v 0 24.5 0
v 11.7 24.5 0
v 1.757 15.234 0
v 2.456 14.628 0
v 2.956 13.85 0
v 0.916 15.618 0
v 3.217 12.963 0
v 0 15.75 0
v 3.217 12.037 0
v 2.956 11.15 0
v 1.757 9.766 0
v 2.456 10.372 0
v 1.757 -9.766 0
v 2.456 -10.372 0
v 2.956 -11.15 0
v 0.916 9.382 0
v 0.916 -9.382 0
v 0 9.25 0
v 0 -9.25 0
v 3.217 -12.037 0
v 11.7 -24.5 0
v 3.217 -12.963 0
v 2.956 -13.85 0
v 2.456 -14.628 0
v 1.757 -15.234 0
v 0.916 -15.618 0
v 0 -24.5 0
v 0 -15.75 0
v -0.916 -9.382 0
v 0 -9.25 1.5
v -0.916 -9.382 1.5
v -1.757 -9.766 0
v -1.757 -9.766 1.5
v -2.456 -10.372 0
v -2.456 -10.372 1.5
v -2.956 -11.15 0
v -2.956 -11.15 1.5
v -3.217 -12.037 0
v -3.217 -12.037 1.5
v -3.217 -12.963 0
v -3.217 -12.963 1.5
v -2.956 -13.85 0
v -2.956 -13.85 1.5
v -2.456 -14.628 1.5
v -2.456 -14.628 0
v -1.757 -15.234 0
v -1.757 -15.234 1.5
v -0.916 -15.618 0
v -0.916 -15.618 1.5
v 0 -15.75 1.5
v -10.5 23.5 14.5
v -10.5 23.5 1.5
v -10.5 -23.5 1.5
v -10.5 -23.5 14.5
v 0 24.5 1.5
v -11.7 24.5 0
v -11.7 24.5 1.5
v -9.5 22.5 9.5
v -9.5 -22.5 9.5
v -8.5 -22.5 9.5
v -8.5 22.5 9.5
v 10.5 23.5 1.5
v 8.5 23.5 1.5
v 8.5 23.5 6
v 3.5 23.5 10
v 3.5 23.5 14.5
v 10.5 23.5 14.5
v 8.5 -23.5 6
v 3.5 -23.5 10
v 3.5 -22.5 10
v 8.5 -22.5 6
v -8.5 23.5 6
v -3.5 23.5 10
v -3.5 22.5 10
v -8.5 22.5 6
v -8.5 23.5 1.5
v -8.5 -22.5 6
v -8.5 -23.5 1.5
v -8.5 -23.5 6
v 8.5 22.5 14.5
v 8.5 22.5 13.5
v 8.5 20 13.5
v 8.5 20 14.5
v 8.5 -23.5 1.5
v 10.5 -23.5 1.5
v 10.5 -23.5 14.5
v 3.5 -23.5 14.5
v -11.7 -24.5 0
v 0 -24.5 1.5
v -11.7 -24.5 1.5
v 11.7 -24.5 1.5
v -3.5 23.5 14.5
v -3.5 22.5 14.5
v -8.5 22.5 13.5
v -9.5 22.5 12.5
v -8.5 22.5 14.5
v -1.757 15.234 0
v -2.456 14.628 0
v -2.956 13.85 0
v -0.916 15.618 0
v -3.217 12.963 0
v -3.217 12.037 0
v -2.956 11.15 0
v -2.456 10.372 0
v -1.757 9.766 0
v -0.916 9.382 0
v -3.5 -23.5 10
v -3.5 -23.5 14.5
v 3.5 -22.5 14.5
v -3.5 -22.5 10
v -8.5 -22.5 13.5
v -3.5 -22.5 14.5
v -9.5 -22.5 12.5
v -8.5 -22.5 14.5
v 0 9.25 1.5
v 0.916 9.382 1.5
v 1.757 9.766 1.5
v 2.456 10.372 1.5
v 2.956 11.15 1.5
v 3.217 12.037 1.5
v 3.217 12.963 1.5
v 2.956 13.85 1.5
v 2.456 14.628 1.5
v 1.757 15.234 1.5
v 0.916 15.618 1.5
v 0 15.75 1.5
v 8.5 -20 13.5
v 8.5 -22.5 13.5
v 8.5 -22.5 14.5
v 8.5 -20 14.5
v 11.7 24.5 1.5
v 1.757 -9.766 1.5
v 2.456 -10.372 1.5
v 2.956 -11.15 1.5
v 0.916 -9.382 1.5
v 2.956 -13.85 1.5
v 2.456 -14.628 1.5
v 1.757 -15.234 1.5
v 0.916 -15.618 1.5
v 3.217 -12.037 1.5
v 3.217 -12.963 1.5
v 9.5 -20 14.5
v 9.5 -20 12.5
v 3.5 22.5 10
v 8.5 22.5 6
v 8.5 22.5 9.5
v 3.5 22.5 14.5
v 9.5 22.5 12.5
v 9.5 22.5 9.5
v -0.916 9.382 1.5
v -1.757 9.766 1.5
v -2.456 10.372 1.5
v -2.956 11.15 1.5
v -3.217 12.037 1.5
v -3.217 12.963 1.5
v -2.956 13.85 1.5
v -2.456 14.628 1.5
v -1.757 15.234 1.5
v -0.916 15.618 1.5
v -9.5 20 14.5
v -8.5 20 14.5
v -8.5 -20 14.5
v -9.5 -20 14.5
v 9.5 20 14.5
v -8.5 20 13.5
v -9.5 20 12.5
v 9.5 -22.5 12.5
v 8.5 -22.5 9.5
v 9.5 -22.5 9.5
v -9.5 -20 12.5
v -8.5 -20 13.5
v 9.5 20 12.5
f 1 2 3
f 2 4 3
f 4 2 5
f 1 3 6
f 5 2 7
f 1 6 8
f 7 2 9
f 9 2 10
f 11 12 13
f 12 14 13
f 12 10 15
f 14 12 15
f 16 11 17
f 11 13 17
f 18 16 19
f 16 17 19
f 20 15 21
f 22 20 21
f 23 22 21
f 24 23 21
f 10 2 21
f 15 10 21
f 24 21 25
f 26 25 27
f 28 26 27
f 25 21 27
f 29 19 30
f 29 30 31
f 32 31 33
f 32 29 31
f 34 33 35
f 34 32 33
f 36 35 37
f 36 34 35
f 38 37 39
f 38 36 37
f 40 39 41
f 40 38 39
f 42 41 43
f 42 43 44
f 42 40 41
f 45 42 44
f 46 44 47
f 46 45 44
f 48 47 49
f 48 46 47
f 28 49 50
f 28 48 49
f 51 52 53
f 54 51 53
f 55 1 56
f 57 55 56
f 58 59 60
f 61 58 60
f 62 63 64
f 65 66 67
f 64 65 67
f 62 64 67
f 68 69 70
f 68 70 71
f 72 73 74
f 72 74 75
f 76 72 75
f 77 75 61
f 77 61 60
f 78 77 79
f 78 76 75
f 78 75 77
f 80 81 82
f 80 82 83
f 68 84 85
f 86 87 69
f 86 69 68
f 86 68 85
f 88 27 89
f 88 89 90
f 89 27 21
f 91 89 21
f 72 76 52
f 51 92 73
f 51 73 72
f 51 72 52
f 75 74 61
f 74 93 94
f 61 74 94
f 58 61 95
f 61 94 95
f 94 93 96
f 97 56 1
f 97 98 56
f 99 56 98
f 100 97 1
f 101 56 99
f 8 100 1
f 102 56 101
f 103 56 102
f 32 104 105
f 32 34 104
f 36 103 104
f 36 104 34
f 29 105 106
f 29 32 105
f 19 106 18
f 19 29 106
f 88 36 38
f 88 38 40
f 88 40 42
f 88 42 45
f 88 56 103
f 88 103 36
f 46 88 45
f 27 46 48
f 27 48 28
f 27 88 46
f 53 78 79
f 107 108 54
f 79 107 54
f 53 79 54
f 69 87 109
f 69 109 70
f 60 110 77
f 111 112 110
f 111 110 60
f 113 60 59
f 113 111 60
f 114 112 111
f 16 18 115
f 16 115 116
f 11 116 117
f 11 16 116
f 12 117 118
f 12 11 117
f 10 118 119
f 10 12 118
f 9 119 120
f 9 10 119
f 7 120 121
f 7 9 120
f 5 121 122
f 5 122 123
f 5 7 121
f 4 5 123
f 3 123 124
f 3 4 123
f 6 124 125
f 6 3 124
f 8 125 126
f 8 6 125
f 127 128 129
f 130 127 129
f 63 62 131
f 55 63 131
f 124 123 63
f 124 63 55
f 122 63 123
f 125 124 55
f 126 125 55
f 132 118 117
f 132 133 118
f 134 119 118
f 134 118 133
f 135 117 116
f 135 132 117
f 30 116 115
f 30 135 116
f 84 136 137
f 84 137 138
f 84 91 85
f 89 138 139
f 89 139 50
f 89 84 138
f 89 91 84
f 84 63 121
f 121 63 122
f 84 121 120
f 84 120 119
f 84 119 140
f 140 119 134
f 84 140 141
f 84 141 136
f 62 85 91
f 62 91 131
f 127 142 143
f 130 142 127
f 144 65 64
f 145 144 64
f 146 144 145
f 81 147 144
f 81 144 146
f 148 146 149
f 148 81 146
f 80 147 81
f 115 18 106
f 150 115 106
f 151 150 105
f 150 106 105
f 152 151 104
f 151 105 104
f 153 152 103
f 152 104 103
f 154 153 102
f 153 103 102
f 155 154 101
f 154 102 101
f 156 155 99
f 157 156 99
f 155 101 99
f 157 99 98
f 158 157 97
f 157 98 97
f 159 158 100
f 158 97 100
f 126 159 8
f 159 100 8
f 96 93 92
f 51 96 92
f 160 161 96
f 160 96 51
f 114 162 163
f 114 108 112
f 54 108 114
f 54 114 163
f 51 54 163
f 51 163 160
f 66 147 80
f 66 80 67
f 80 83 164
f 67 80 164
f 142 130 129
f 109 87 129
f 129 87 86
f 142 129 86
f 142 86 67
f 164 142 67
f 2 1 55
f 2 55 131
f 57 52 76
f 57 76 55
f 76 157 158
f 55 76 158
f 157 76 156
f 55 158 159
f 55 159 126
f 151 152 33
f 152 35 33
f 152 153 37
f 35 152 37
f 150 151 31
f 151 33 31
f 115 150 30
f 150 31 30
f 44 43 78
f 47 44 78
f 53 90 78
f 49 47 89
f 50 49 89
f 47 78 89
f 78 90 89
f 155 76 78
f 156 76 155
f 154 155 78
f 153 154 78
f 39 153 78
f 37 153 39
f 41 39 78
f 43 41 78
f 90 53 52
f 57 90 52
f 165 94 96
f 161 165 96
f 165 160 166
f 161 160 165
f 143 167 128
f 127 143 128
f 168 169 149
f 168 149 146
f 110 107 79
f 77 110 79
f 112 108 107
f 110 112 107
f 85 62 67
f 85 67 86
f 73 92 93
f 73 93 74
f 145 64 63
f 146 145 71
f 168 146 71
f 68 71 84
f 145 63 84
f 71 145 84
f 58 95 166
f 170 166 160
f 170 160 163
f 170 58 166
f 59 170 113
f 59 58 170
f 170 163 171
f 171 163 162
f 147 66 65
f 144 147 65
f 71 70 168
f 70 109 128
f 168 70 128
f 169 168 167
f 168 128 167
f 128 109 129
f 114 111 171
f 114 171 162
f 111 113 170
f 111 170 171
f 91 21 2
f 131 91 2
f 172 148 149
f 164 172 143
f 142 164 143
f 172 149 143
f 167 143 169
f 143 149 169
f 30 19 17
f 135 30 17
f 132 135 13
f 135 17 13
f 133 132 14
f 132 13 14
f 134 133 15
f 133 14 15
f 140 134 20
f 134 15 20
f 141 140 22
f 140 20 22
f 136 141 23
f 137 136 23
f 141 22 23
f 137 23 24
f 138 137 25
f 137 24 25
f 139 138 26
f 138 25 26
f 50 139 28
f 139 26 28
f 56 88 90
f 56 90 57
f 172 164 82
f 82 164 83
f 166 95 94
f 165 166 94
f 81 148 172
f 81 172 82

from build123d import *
from build123d import SkipClean  # not in build123d's __all__

# Parameters (mm, degrees)
F1_DEPTH = 1.5
F2_W     = 2
F2_H     = 23.5
F3_DEPTH = 8
F4_W     = 1
F4_H     = 23.5
F5_DEPTH = 5
F7_DEPTH = 1
F9_DEPTH = 2.5


# Not quite as in the source:
# - a feature names something its author has since deleted; it is built from what else it names


with BuildPart() as f1:
    # F0 (on Top) → F1 (new body)
    with BuildSketch(Plane.XY):
        with BuildLine():
            ThreePointArc((0, 9.25), (-3.25, 12.5), (0, 15.75))
            Line((0, 15.75), (0, 24.5))
            Line((0, 24.5), (-11.7, 24.5))
            Line((-11.7, 24.5), (-11.7, 0))
            Line((-11.7, 0), (0, 0))
            Line((0, 0), (0, 9.25))
        make_face()
    extrude(amount=F1_DEPTH)

    # F2 (on face) → F3 (join)
    with BuildSketch(Plane.XY.offset(1.5)):
        with Locations((-9.5, 11.75)):
            Rectangle(F2_W, F2_H)
    extrude(amount=F3_DEPTH)

    # F4 (on face) → F5 (join)
    with BuildSketch(Plane.XY.offset(9.5)):
        with Locations((-10, 11.75)):
            Rectangle(F4_W, F4_H)
    extrude(amount=F5_DEPTH)

    # F6 (on face) → F7 (join)
    with BuildSketch(Plane(origin=(0, 23.5, 0), x_dir=(-1, 0, 0), z_dir=(0, 1, 0))):
        Polygon((9.5, 9.5), (9.5, 14.5), (3.5, 14.5), (3.5, 10), (8.5, 6), (8.5, 9.5), align=None)
    extrude(amount=-F7_DEPTH)

    # F8 (on face) → F9 (join)
    with BuildSketch(Plane.XZ.offset(-22.5)):
        Polygon((-8.5, 14.5), (-9.5, 14.5), (-9.5, 12.5), (-8.5, 13.5), align=None)
    extrude(amount=F9_DEPTH)

    # F10: F1 across plane


with BuildPart() as f1_1:
    add(f1.part, clean=False)
    add(f1.part.mirror(Plane.XZ), clean=False)

    # F11: F1 across plane


with BuildPart() as f1_2:
    add(f1_1.part, clean=False)
    with SkipClean():  # cleaning this boolean's faces spoils the solid; the shape is the same uncleaned
        add(f1_1.part.mirror(Plane.YZ), clean=False)


solid = f1_2.part
